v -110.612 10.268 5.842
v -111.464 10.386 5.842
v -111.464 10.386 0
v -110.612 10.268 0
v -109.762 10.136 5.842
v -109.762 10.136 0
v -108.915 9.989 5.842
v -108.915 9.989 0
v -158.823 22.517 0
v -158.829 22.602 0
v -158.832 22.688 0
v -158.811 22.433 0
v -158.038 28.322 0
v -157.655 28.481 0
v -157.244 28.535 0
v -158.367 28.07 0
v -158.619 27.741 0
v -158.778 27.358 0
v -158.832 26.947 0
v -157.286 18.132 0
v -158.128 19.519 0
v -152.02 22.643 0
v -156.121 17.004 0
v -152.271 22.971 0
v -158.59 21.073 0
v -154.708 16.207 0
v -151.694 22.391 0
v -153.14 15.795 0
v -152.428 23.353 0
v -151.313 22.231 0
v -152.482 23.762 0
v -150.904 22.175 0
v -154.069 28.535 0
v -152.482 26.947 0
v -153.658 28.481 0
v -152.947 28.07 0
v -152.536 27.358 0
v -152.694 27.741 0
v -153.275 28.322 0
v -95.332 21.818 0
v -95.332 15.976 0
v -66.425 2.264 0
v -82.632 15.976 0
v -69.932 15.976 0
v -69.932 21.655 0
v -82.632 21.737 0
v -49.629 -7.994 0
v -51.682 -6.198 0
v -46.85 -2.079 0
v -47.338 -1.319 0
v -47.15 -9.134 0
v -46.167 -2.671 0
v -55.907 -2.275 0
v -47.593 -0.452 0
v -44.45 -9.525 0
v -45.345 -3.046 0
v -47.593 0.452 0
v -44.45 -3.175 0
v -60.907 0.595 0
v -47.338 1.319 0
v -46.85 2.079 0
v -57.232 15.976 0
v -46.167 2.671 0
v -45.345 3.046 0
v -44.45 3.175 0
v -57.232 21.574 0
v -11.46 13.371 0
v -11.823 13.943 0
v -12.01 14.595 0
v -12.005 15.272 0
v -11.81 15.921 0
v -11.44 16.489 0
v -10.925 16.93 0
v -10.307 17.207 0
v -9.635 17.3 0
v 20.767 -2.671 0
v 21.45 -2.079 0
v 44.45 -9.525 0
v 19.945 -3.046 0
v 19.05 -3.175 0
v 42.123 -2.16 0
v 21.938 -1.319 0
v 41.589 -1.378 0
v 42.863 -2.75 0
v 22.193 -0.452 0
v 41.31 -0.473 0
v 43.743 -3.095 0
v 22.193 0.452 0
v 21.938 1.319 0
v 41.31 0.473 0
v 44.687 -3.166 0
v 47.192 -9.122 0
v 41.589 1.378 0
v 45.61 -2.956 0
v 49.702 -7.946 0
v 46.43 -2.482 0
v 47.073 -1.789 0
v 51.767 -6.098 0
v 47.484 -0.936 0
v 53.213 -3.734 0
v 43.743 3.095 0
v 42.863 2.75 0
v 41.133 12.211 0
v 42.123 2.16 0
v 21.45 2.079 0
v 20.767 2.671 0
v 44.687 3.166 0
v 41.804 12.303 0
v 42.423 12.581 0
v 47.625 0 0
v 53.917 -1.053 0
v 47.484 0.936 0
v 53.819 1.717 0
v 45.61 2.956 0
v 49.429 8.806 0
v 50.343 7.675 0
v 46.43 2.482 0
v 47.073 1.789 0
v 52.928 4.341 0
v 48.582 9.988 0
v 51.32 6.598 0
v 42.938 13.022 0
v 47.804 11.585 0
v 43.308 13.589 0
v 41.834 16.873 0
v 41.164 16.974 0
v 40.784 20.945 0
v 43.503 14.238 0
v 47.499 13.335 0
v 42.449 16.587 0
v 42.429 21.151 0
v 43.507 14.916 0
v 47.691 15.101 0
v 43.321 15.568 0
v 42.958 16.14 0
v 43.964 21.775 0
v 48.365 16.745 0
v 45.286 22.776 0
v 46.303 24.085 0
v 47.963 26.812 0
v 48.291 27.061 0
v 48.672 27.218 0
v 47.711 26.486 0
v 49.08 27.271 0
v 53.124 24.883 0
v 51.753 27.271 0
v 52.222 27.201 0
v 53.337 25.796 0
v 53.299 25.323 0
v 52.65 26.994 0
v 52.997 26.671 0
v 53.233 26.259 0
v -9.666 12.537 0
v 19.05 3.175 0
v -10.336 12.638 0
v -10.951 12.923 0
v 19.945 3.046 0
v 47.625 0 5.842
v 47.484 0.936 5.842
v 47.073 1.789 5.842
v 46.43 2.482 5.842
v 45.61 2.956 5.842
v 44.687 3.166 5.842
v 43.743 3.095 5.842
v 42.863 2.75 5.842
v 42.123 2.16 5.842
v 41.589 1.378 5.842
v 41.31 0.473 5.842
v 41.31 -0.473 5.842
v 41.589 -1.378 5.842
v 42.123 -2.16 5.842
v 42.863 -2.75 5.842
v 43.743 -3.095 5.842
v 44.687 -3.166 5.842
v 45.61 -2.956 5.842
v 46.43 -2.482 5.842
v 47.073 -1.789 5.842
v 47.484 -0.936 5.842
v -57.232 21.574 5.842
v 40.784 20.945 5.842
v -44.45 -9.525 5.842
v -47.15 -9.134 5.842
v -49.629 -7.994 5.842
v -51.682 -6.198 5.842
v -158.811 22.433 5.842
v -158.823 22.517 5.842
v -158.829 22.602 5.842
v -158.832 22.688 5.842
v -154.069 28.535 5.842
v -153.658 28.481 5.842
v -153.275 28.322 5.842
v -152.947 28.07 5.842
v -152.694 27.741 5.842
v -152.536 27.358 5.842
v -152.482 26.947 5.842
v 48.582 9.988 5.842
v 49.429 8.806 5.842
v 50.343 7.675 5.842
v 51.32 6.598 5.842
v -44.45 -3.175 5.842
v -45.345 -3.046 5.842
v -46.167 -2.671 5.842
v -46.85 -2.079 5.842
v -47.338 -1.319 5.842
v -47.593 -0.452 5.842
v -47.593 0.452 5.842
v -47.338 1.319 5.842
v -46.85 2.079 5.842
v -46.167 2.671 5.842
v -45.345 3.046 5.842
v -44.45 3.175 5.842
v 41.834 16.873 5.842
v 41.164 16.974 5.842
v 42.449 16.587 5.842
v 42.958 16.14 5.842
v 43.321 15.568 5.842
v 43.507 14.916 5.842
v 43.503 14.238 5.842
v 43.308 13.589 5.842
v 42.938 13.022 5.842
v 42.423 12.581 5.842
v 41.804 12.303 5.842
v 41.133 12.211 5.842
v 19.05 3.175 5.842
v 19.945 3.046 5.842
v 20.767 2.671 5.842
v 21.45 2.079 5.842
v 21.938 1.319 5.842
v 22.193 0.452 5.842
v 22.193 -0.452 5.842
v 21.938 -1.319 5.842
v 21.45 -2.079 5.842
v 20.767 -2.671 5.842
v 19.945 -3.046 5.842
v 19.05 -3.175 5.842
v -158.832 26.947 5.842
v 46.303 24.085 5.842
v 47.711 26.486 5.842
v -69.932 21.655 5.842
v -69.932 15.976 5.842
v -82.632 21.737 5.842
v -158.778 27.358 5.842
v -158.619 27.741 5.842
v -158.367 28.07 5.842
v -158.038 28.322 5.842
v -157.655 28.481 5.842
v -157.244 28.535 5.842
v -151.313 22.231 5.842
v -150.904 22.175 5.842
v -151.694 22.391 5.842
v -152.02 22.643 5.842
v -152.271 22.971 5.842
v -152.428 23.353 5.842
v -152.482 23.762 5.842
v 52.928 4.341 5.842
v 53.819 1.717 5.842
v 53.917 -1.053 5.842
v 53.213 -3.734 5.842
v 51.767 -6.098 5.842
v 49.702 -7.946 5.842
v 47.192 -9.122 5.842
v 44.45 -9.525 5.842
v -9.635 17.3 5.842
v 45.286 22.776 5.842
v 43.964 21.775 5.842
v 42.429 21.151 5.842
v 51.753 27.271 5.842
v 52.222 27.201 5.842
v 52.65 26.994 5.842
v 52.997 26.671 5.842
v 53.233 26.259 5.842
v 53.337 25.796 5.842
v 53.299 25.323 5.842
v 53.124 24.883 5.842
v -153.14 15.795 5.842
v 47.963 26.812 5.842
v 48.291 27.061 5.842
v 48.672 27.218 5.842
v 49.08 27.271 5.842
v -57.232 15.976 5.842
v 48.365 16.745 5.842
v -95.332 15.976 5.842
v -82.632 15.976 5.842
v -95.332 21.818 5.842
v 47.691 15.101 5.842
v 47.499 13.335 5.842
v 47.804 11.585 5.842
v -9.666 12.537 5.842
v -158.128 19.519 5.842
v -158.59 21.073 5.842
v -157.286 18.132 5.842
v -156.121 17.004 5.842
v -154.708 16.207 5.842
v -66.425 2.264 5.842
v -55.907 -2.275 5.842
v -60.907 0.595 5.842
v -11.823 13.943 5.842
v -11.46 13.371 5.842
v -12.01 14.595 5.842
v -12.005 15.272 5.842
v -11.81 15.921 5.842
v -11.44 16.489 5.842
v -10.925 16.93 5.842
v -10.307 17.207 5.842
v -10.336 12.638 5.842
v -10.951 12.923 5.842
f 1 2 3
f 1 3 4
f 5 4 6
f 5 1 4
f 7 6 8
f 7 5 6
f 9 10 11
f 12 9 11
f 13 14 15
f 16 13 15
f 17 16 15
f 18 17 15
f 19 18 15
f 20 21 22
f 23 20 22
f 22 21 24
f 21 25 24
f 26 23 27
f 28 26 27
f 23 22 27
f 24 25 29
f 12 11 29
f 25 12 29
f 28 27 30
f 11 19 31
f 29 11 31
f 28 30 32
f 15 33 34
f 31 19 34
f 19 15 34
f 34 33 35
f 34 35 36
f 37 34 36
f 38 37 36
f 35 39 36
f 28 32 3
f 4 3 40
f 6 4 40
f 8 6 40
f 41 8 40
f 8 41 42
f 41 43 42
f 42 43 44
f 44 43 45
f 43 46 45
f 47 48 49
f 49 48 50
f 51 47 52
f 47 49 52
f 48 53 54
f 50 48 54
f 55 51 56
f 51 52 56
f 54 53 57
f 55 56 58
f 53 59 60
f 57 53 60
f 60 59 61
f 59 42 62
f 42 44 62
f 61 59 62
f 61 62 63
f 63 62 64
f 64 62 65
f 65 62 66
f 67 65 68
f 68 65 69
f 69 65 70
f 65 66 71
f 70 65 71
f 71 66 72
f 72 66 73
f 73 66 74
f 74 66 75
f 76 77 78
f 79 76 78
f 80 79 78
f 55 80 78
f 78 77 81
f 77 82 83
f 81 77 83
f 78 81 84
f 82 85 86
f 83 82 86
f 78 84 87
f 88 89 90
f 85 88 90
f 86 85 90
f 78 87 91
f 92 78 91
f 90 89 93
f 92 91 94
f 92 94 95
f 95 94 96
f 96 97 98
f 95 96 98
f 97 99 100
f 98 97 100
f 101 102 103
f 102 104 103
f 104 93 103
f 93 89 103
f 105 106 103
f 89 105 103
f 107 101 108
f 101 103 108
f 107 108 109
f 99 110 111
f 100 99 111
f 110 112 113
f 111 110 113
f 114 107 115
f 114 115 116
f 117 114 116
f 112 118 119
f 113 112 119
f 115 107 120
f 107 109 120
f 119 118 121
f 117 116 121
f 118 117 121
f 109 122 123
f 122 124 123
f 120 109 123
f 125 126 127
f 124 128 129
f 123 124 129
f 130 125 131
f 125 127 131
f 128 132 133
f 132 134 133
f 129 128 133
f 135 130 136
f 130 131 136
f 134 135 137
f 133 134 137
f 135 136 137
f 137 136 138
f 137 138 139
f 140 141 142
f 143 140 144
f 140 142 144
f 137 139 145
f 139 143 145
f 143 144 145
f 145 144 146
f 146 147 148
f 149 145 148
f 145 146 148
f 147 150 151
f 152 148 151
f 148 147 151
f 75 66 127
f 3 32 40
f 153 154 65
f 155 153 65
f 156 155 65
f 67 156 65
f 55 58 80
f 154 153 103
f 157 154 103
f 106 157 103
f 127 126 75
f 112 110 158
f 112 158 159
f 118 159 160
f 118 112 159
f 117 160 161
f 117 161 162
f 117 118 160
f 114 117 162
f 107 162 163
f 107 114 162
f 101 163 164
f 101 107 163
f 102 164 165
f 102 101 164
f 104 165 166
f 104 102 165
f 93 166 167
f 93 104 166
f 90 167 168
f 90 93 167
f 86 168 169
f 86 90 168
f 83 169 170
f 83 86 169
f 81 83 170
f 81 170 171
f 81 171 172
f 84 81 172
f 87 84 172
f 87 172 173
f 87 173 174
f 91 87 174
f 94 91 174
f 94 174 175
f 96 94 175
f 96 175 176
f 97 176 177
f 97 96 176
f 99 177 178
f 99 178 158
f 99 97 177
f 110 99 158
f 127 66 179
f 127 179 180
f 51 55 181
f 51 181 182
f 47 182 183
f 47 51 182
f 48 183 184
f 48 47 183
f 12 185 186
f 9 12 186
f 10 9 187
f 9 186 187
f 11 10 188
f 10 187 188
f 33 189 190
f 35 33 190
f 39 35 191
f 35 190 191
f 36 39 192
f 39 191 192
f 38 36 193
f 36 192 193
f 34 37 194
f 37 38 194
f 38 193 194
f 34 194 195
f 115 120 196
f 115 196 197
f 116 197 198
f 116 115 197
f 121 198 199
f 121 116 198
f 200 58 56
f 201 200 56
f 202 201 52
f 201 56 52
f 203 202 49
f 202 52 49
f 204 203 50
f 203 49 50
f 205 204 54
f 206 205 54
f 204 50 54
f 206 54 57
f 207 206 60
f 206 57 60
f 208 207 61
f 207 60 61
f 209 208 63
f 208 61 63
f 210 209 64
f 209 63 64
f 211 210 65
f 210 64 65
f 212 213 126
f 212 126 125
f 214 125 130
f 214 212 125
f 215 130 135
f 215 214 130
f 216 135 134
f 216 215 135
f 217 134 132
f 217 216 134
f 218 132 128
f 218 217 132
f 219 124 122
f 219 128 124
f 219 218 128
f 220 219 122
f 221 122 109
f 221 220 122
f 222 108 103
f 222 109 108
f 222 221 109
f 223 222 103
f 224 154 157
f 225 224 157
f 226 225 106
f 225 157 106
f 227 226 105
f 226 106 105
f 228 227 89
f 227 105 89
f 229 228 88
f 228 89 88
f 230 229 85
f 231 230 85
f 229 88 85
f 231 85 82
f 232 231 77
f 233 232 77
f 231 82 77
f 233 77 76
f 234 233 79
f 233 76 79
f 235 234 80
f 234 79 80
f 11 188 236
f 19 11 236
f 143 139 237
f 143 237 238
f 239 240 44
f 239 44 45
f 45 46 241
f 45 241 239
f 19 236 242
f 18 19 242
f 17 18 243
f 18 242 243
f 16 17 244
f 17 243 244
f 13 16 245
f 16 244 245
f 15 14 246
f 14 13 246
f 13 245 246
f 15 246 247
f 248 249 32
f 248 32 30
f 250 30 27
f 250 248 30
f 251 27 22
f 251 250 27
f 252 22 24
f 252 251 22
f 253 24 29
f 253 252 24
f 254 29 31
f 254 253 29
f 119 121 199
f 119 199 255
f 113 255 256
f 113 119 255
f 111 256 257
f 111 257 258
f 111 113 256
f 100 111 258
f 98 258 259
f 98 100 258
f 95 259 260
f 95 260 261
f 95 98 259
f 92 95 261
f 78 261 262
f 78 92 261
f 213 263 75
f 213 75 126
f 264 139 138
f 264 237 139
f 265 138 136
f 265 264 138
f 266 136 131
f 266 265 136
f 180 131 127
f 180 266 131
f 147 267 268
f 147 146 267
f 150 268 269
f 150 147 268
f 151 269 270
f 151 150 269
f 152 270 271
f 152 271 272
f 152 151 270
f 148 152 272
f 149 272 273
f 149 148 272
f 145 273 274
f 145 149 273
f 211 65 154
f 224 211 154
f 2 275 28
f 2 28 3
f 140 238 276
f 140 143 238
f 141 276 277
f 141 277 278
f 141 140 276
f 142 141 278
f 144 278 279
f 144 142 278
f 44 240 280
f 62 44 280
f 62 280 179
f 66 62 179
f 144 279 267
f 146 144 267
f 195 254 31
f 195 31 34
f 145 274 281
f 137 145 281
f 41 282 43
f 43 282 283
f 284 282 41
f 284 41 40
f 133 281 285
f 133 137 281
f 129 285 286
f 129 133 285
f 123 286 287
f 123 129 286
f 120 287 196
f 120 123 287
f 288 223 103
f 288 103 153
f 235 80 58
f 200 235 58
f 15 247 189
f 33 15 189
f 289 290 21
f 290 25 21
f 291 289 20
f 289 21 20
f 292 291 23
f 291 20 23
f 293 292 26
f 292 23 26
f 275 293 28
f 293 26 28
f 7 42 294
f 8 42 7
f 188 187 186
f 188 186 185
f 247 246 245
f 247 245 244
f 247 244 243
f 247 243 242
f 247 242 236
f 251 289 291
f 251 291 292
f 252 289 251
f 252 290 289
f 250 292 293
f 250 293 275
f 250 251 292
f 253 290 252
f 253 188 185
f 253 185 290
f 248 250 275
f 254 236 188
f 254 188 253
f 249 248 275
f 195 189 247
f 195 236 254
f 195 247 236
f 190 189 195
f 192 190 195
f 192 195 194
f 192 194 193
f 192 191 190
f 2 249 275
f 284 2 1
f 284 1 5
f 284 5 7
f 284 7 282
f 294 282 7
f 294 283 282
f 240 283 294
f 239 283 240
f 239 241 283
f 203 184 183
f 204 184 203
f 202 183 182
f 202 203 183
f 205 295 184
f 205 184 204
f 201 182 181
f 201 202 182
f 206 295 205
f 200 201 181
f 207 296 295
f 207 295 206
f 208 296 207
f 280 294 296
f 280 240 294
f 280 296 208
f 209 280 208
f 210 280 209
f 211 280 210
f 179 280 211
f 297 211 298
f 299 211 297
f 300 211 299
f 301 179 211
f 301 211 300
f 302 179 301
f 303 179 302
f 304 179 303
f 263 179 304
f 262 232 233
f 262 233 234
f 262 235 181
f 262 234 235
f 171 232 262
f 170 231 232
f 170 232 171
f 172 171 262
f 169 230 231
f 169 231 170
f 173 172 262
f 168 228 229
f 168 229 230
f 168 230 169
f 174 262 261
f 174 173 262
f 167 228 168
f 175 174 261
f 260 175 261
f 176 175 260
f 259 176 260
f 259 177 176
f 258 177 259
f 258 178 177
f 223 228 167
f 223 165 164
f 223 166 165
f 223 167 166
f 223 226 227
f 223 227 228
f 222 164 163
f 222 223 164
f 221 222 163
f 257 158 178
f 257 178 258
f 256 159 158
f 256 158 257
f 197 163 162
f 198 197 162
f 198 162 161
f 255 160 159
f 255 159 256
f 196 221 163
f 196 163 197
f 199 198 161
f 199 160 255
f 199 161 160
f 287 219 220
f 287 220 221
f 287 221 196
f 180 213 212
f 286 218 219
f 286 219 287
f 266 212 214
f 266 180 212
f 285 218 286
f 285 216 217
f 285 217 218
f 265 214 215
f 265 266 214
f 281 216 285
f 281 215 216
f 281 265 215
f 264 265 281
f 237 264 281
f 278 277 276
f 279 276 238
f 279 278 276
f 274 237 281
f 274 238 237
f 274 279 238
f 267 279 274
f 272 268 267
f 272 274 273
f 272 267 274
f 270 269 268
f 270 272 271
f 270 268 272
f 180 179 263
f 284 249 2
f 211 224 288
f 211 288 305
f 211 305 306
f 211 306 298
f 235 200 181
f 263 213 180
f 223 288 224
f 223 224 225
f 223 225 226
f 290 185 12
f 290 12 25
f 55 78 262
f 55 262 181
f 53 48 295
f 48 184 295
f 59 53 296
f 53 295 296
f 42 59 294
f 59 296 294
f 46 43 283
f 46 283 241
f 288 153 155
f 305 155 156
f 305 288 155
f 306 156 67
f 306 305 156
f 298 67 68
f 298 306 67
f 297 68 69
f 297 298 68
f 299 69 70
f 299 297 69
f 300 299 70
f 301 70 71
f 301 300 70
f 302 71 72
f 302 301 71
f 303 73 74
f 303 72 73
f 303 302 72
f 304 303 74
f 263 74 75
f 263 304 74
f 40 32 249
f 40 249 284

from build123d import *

# Parameters (mm, degrees)
SKETCH1_R           = 3.175
BOSS_EXTRUDE1_DEPTH = 5.842
FILLET1_R           = 25.4
SKETCH2_W           = 6.35
SKETCH2_H           = 6.35
BOSS_EXTRUDE2_DEPTH = 5.842
FILLET4_R           = 1.5875
FILLET5_R           = 25.4
FILLET6_R           = 6.35
SKETCH3_W           = 12.7
SKETCH3_H           = 5.842
CUT_EXTRUDE1_DEPTH  = 162.480283814
BOSS_EXTRUDE3_DEPTH = 5.842
FILLET7_R           = 6.35
FILLET8_R           = 1.5875
CUT_EXTRUDE2_DEPTH  = 162.480283814
BOSS_EXTRUDE4_DEPTH = 5.842
FILLET9_R           = 6.35
FILLET10_R          = 50.8


with BuildPart() as part:
    # Sketch1 → Boss-Extrude1 (new body)
    with BuildSketch(Plane.XY):
        with BuildLine():
            Line((44.45, -9.525), (-44.45, -9.525))
            ThreePointArc((-44.45, -9.525), (-51.185192091, -6.735192091), (-53.975, 0))
            Line((-53.975, 0), (-158.75, 19.05))
            Line((-158.75, 19.05), (-158.75, 22.225))
            Line((-158.75, 22.225), (44.45, 20.921420052))
            Line((44.45, 20.921420052), (44.45, 9.525))
            ThreePointArc((44.45, 9.525), (53.975, 0), (44.45, -9.525))
        make_face()
        with Locations((44.45, 0)):
            Circle(SKETCH1_R, mode=Mode.SUBTRACT)
        with BuildLine():
            Line((19.05, -3.175), (-44.45, -3.175))
            ThreePointArc((-44.45, -3.175), (-47.625, 0), (-44.45, 3.175))
            Line((-44.45, 3.175), (19.05, 3.175))
            ThreePointArc((19.05, 3.175), (22.225, 0), (19.05, -3.175))
        make_face(mode=Mode.SUBTRACT)
    extrude(amount=BOSS_EXTRUDE1_DEPTH)

    # Fillet1
    # the kernel refuses this fillet: 25.4 mm, written as the material it adds along each edge
    with BuildSketch(Plane(origin=(44.45, 9.525, 0), x_dir=(0, 1, 0), z_dir=(0, 0, 1))) as fillet1_piece_1:
        with BuildLine():
            CenterArc((14.667942914, -25.188432626), FILLET1_R, 97.400260925, 36.444857628)
            Line((-2.92692466, -6.869572534), (-3.278822011, -6.503195333))
            ThreePointArc((-3.278822011, -6.503195333), (-1.229577289, -3.534437867), (-0.508, 0))
            Line((-0.508, 0), (0, 0.508))
            ThreePointArc((0, 0.508), (5.698210026, 0.508), (11.330989595, 0.503768653))
            Line((11.330989595, 0.503768653), (11.396420052, 0))
        make_face()
    extrude(amount=5.842)

    # Sketch2 → Boss-Extrude2 (add)
    with BuildSketch(Plane.XY.offset(5.842)):
        with Locations((-155.65673172, 25.359787457)):
            Rectangle(SKETCH2_W, SKETCH2_H)
    extrude(amount=-BOSS_EXTRUDE2_DEPTH)

    # Fillet4
    # the kernel refuses this fillet: 1.5875 mm, written as the material it adds along each edge
    with BuildSketch(Plane(origin=(-152.48173172, 22.184787457, 5.842), x_dir=(0.9999794228826333, -0.00641512363991872, 0), z_dir=(0, 0, -1))) as fillet4_piece_1:
        with BuildLine():
            CenterArc((FILLET4_R * 0.993605321893, -FILLET4_R), FILLET4_R, 90, 89.632437969)
            Line((-FILLET4_R * 0.00637410098923, -FILLET4_R * 0.99358487636), (0, 0))
            Line((0, 0), (FILLET4_R * 0.993605321893, 0))
        make_face()
    extrude(amount=5.842)
    # the kernel refuses this fillet: 1.5875 mm, written as the material it takes off along each edge
    with BuildSketch(Plane(origin=(-158.83173172, 28.534787457, 9.81075), x_dir=(0, -1, 0), z_dir=(0, 0, -1)), Plane(origin=(-152.48173172, 28.534787457, 9.81075), x_dir=(-1, 0, 0), z_dir=(0, 0, -1))) as fillet4_2_piece_1:
        with BuildLine():
            CenterArc((FILLET4_R, -FILLET4_R), FILLET4_R, 90, 90)
            Line((0, -FILLET4_R), (0, 0))
            Line((0, 0), (FILLET4_R, 0))
        make_face()
    extrude(amount=13.7795, mode=Mode.SUBTRACT)
    with BuildSketch(Plane(origin=(-158.83173172, 22.184787457, 7.099025602), x_dir=(1.0, 1.4344436985779291e-12, 0), z_dir=(0, 0, -1))) as fillet4_2_piece_2:
        with BuildLine():
            CenterArc((1.5875, -0.502810241), FILLET4_R, 161.534664076, 18.465335924)
            Line((0, -0.502810241), (0, 0))
            Line((0, 0), (0.08173172, 0))
        make_face()
    extrude(amount=8.356051205, mode=Mode.SUBTRACT)

    # Fillet5
    fillet5_edges = [part.edges().sort_by_distance(p)[0] for p in [
        (-53.975, 0, 2.921),
    ]]
    fillet(fillet5_edges, radius=FILLET5_R)

    # Fillet6
    # the kernel refuses this fillet: 6.35 mm, written as the material it takes off along each edge
    with BuildSketch(Plane(origin=(-158.75, 19.05, -12.212686772), x_dir=(0.9838699100999072, -0.17888543819998437, 0), z_dir=(0, 0, 1))) as fillet6_piece_1:
        with BuildLine():
            CenterArc((4.885074709, 6.35), FILLET6_R, 210.950382336, 59.049617664)
            Line((-0.560767828, 3.084223053), (0, 0))
            Line((0, 0), (4.885074709, 0))
        make_face()
    extrude(amount=30.267373544, mode=Mode.SUBTRACT)

    # Sketch3 → Cut-Extrude1 (cut, through all)
    with BuildSketch(Plane.XY.offset(5.842)):
        with Locations((-88.98173172, 18.897155596)):
            Rectangle(SKETCH3_W, SKETCH3_H)
        with Locations((-63.58173172, 18.897155596)):
            Rectangle(SKETCH3_W, SKETCH3_H)
    extrude(amount=-CUT_EXTRUDE1_DEPTH, mode=Mode.SUBTRACT)

    # Sketch4 → Boss-Extrude3 (add)
    with BuildSketch(Plane.XY.offset(5.842)):
        Polygon((44.45, 20.921420052), (48.170691966, 27.271420052), (54.520691966, 27.271420052), (46.540749413, 13.626153894), (43.362669871, 15.484739273), align=None)
    extrude(amount=-BOSS_EXTRUDE3_DEPTH)

    # Fillet7
    fillet7_edges = [part.edges().sort_by_distance(p)[0] for p in [
        (44.45, 20.921420052, 2.921),
        (46.540749413, 13.626153894, 2.921),
    ]]
    fillet(fillet7_edges, radius=FILLET7_R)

    # Fillet8
    fillet8_edges = [part.edges().sort_by_distance(p)[0] for p in [
        (48.170691966, 27.271420052, 2.921),
        (54.520691966, 27.271420052, 2.921),
    ]]
    fillet(fillet8_edges, radius=FILLET8_R)

    # Sketch5 → Cut-Extrude2 (cut, through all)
    with BuildSketch(Plane.XY.offset(5.842)):
        with BuildLine():
            Line((41.13300152, 12.211269778), (-9.665953162, 12.537158059))
            ThreePointArc((-9.665953162, 12.537158059), (-12.03187815, 14.933635073), (-9.635401136, 17.29956006))
            Line((-9.635401136, 17.29956006), (41.163553547, 16.97367178))
            ThreePointArc((41.163553547, 16.97367178), (43.529478534, 14.577194766), (41.13300152, 12.211269778))
        make_face()
    extrude(amount=-CUT_EXTRUDE2_DEPTH, mode=Mode.SUBTRACT)

    # Sketch6 → Boss-Extrude4 (add)
    with BuildSketch(Plane.XY.offset(5.842)):
        Polygon((-158.811165573, 22.432892862), (-157.831118293, 16.403681612), (-110.184513465, 10.219911539), align=None)
    extrude(amount=-BOSS_EXTRUDE4_DEPTH)

    # Fillet9
    fillet9_edges = [part.edges().sort_by_distance(p)[0] for p in [
        (-157.831118293, 16.403681612, 2.921),
    ]]
    fillet(fillet9_edges, radius=FILLET9_R)

    # Fillet10
    # the kernel refuses this fillet: 50.8 mm, written as the material it adds along each edge
    with BuildSketch(Plane(origin=(-110.184513465, 10.219911539, 5.842), x_dir=(-0.9916829703779194, 0.1287046474002651, 0), z_dir=(0, 0, -1))) as fillet10_piece_1:
        with BuildLine():
            CenterArc((FILLET10_R * 0.0254008846311, -FILLET10_R), FILLET10_R, 90, 2.910101208)
            Line((-FILLET10_R * 0.0253681282132, -FILLET10_R * 0.0012895778381), (0, 0))
            Line((0, 0), (FILLET10_R * 0.0254008846311, 0))
        make_face()
    extrude(amount=5.842)


solid = part.part
